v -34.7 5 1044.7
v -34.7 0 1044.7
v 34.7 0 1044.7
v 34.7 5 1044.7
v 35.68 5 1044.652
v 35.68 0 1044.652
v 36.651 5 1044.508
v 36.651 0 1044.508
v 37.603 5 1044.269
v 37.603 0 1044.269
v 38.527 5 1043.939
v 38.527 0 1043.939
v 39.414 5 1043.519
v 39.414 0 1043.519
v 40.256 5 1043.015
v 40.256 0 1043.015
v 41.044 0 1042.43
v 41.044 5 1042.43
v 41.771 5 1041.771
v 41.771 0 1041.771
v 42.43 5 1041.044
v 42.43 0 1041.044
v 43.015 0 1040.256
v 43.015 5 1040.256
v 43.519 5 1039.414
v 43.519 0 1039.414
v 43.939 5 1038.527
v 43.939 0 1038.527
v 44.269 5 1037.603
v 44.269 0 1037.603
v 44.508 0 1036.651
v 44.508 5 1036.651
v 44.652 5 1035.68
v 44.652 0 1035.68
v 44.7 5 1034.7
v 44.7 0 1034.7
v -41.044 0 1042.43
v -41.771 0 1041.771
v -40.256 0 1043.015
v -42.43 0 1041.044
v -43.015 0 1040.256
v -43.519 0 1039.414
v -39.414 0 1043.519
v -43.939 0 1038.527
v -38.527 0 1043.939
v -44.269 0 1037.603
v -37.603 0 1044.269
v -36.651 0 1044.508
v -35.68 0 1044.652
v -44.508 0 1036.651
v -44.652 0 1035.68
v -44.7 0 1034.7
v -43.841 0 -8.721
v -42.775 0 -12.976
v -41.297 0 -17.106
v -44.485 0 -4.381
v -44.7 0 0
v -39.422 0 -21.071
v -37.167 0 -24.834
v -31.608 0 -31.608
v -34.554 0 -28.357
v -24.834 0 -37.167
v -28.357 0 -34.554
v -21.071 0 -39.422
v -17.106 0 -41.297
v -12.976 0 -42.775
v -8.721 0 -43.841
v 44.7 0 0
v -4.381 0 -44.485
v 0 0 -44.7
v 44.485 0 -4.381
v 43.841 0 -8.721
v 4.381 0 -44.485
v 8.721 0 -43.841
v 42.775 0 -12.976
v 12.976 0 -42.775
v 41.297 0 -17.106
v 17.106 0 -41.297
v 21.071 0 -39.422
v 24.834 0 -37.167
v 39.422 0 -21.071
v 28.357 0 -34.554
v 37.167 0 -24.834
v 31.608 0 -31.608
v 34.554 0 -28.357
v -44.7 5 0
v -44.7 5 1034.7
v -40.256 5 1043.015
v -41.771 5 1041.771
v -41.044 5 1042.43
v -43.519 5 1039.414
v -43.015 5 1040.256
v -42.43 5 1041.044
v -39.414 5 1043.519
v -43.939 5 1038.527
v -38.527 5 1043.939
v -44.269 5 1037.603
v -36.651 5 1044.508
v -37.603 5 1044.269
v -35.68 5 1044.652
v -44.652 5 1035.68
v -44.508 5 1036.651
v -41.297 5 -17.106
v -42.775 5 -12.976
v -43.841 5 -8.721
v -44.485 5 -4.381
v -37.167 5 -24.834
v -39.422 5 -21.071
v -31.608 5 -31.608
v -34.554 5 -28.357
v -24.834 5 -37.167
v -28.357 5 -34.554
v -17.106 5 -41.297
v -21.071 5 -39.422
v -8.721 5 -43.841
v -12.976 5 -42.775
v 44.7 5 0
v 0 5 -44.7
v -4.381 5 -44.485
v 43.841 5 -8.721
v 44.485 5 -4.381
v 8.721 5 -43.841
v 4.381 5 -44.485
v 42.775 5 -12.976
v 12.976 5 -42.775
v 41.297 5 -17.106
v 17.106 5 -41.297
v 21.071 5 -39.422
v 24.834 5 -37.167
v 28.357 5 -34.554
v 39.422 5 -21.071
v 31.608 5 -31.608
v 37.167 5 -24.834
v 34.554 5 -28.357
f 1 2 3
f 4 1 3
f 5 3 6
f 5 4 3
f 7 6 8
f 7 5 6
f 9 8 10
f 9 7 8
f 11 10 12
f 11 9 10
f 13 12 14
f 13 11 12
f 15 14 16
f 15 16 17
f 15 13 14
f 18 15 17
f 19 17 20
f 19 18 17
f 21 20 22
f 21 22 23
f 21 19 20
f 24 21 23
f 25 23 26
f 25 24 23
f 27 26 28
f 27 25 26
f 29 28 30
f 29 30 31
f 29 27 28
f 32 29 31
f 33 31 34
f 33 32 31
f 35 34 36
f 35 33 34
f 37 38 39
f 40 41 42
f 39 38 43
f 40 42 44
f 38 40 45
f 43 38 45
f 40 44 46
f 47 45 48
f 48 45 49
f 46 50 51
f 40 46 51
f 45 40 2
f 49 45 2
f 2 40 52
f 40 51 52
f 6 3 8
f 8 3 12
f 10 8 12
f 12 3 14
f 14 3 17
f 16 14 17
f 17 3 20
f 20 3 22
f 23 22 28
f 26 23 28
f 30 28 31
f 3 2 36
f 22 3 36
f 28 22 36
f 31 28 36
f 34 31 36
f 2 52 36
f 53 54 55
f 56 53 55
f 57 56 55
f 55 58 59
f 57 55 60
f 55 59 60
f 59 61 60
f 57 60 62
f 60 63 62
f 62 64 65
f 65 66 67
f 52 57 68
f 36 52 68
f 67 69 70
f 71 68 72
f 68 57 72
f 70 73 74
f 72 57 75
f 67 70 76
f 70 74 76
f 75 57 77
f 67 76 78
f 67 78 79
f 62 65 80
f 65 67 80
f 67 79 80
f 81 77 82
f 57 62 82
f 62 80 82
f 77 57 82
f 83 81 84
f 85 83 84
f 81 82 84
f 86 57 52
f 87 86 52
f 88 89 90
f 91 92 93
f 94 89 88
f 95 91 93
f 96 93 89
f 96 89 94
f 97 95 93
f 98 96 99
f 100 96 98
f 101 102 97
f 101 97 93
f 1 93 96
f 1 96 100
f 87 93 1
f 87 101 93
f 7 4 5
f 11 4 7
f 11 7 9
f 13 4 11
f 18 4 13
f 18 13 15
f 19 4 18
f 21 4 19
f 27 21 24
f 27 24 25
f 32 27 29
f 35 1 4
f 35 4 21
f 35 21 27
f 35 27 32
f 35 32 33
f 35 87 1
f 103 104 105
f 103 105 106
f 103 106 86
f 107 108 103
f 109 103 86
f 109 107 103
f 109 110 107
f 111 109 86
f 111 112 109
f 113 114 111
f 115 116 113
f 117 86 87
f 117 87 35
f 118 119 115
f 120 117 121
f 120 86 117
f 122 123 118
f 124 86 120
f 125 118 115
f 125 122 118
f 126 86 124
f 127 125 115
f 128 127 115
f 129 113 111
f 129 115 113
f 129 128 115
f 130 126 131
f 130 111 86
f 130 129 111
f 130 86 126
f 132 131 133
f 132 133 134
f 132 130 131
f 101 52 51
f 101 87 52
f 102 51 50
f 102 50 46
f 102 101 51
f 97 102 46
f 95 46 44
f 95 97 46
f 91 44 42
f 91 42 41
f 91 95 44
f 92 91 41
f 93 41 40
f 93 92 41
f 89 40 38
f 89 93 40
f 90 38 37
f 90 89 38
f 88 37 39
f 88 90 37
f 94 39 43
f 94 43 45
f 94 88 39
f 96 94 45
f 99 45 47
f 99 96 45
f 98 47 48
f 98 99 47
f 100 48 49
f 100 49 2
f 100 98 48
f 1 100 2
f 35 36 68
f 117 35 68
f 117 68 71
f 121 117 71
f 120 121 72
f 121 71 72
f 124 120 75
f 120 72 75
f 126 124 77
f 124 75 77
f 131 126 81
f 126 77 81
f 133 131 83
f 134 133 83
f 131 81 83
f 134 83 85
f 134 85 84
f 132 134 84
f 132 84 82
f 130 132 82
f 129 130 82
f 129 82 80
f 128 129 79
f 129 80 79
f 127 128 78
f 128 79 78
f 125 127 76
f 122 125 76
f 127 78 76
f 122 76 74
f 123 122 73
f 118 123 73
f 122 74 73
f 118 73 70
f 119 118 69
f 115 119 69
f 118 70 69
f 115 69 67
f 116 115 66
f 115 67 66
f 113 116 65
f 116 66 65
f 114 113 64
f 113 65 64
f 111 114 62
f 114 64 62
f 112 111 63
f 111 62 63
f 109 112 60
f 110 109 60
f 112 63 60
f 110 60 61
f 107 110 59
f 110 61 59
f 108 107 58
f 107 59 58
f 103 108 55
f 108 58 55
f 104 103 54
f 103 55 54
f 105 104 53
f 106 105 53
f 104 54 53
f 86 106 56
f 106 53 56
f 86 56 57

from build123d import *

# Parameters (mm, degrees)
SKETCH1_R           = 44.7
BOSS_EXTRUDE1_DEPTH = 5
FILLET1_R           = 10


with BuildPart() as part:
    # Sketch1 → Boss-Extrude1 (new body)
    with BuildSketch(Plane(origin=(0, 0, 0), x_dir=(1, 0, 0), z_dir=(0, 1, 0))):
        with BuildLine():
            ThreePointArc((44.7, 0), (0, -44.7), (-44.7, 0))
            Line((-44.7, 0), (-44.7, -1044.7))
            Line((-44.7, -1044.7), (44.7, -1044.7))
            Line((44.7, -1044.7), (44.7, 0))
        make_face()
        Circle(SKETCH1_R)
    extrude(amount=BOSS_EXTRUDE1_DEPTH)

    # Fillet1
    fillet1_edges = [part.edges().sort_by_distance(p)[0] for p in [
        (44.7, 2.5, 1044.7),
        (-44.7, 2.5, 1044.7),
    ]]
    fillet(fillet1_edges, radius=FILLET1_R)


solid = part.part
